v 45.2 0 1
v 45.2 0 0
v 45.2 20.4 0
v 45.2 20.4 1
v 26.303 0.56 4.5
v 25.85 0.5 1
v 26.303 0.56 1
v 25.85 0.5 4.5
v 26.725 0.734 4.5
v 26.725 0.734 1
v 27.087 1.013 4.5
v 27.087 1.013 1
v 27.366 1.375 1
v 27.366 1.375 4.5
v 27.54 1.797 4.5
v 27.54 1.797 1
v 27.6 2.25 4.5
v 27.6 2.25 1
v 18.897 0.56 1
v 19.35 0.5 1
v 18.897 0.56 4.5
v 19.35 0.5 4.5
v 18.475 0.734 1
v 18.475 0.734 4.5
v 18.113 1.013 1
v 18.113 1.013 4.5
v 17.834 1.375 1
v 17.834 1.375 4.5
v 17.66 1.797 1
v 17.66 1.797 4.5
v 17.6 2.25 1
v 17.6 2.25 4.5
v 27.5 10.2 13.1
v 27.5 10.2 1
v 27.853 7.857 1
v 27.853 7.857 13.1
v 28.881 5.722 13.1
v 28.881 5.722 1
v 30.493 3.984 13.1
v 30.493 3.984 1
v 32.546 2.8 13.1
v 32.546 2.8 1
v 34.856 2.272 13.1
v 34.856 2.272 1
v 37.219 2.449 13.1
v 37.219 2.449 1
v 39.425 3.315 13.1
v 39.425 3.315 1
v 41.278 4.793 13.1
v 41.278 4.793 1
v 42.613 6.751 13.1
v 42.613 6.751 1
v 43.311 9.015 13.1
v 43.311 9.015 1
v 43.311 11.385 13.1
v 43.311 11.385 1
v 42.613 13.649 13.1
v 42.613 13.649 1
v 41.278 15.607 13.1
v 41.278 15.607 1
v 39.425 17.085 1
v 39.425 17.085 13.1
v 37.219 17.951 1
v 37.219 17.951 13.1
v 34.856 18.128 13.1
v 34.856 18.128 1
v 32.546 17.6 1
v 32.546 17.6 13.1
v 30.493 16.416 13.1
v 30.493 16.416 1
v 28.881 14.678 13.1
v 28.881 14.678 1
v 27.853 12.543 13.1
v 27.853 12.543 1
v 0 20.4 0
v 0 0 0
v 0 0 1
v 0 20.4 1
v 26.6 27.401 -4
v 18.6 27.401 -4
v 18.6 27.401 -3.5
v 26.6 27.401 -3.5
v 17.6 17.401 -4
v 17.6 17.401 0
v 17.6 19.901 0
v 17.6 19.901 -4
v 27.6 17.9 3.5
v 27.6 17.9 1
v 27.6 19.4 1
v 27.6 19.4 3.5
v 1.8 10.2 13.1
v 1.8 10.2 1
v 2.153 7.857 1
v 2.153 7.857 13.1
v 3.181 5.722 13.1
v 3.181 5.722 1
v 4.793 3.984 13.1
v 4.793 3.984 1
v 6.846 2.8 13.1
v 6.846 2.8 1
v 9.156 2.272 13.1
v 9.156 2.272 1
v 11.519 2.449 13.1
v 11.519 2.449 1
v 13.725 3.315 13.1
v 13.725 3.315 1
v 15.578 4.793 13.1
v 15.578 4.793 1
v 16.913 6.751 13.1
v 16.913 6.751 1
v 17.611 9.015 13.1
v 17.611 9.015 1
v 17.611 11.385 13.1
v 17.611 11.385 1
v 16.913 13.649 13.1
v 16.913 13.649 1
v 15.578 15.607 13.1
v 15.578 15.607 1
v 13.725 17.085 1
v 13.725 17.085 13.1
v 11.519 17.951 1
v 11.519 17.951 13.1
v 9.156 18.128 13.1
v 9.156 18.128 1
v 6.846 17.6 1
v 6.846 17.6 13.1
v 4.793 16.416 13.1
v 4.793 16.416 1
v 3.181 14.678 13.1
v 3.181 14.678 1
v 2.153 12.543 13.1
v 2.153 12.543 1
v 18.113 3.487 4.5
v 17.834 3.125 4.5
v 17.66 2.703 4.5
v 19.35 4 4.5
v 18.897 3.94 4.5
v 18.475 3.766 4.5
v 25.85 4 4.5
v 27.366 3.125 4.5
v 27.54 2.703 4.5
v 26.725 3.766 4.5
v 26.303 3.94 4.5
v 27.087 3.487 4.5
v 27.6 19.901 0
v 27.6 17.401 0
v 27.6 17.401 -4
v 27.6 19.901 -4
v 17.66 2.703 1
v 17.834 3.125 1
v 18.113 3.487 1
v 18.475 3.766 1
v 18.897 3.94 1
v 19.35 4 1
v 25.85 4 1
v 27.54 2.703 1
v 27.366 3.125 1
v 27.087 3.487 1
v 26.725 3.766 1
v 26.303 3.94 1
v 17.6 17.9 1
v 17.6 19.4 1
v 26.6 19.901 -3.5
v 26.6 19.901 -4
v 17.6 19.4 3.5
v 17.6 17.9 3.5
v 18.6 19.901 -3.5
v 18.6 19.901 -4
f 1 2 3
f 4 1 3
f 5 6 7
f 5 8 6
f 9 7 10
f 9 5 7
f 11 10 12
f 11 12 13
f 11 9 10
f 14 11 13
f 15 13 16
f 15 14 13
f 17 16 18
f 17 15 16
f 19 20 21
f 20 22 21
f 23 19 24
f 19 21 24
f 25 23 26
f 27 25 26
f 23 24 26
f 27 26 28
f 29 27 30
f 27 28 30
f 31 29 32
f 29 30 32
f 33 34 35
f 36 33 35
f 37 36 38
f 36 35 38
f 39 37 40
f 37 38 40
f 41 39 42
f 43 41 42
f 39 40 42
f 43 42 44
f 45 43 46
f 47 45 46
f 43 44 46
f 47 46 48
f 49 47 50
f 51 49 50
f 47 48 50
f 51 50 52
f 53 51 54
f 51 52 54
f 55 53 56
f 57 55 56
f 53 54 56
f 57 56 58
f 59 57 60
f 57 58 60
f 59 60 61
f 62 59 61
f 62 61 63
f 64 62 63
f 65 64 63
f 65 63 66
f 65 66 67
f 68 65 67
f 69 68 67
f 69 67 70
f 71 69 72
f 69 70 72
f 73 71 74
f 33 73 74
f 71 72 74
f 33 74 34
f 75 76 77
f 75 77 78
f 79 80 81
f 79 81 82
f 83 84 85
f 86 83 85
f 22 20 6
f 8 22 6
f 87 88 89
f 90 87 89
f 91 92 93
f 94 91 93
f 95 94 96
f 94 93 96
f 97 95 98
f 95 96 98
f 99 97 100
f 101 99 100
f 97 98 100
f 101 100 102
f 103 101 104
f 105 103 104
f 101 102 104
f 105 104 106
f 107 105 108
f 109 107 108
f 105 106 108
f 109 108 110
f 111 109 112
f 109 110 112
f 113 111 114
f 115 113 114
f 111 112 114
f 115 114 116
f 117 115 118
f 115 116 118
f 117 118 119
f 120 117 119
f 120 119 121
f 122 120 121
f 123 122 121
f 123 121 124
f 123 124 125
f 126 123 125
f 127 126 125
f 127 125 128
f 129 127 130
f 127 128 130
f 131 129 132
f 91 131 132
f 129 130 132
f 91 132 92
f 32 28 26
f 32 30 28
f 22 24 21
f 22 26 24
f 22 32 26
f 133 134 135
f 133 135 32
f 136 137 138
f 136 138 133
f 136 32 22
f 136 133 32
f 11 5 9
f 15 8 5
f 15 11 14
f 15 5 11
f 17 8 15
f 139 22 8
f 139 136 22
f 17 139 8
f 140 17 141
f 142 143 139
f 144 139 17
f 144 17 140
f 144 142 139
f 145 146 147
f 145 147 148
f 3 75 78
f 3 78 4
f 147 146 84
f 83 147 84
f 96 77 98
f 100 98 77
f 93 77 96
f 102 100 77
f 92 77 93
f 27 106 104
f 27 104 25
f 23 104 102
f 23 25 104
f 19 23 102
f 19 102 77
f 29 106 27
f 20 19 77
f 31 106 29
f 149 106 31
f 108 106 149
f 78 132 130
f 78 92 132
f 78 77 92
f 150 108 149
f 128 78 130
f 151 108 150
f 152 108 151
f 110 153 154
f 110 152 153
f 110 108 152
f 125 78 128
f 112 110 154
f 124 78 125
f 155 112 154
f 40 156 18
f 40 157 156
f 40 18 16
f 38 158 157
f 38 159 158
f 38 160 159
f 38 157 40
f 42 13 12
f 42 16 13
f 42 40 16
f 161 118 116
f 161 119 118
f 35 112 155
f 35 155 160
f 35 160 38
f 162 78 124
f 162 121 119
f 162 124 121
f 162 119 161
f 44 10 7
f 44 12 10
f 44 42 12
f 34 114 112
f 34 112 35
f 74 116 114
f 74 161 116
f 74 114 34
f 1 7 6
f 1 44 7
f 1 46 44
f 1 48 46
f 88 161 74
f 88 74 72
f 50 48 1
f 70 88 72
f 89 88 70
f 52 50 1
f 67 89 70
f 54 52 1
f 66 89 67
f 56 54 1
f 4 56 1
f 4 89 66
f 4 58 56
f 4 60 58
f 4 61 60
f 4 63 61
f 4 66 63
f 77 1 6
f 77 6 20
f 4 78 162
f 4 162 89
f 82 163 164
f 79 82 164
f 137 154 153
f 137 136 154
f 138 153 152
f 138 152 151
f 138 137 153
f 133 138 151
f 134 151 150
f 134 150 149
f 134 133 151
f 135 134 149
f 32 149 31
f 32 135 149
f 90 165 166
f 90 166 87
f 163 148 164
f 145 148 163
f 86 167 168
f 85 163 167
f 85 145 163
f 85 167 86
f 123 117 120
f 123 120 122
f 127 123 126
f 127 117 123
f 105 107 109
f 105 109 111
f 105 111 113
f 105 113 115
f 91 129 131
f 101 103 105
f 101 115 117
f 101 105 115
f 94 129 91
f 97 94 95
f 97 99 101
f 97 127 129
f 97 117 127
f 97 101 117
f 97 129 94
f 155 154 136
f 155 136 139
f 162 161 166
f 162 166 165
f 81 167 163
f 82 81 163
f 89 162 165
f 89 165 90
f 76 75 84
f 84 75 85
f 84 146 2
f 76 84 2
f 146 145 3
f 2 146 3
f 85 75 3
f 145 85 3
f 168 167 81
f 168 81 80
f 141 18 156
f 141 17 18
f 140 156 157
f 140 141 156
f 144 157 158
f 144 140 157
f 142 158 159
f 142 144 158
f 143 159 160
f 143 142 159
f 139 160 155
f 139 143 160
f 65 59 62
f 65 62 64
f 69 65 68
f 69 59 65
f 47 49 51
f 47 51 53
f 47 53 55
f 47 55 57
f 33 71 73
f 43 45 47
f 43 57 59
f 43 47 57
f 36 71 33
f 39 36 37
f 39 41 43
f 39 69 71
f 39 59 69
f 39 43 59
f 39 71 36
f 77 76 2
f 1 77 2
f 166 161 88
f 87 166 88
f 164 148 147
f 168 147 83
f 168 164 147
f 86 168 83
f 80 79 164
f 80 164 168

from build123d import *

# Parameters (mm, degrees)
ESBO_O1_W                = 45.2
ESBO_O1_H                = 20.4
RESSALTO_EXTRUS_O1_DEPTH = 1
ESBO_O2_R                = 7.95
RESSALTO_EXTRUS_O2_DEPTH = 12.1
ESBO_O3_W                = 10
ESBO_O3_H                = 3.5
RESSALTO_EXTRUS_O3_DEPTH = 3.5
FILETE1_R                = 1.75
ESBO_O4_W                = 10
ESBO_O4_H                = 2.5
RESSALTO_EXTRUS_O4_DEPTH = 4
ESBO_O5_W                = 8
ESBO_O5_H                = 0.5
RESSALTO_EXTRUS_O5_DEPTH = 7.5
ESBO_O7_W                = 10
ESBO_O7_H                = 1.5
RESSALTO_EXTRUS_O6_DEPTH = 2.5


with BuildPart() as part:
    # Esboço1 → Ressalto-extrusão1 (new body)
    with BuildSketch(Plane.XY):
        with Locations((22.6, 10.2)):
            Rectangle(ESBO_O1_W, ESBO_O1_H)
    extrude(amount=RESSALTO_EXTRUS_O1_DEPTH)

    # Esboço2 → Ressalto-extrusão2 (add)
    with BuildSketch(Plane.XY.offset(1)):
        with Locations(Location((9.75, 10.2, 0), (0, 0, 180))):
            Circle(ESBO_O2_R)
        with Locations(Location((35.45, 10.2, 0), (0, 0, 180))):
            Circle(ESBO_O2_R)
    extrude(amount=RESSALTO_EXTRUS_O2_DEPTH)

    # Esboço3 → Ressalto-extrusão3 (add)
    with BuildSketch(Plane.XY.offset(1)):
        with Locations((22.6, 2.25)):
            Rectangle(ESBO_O3_W, ESBO_O3_H)
    extrude(amount=RESSALTO_EXTRUS_O3_DEPTH)

    # Filete1
    filete1_edges = [part.edges().sort_by_distance(p)[0] for p in [
        (27.6, 0.5, 2.75),
        (27.6, 4, 2.75),
        (17.6, 4, 2.75),
        (17.6, 0.5, 2.75),
    ]]
    fillet(filete1_edges, radius=FILETE1_R - 0.0001)  # a hair under: the kernel refuses the full size

    # Esboço4 → Ressalto-extrusão4 (add)
    with BuildSketch(Plane(origin=(0, 0, 0), x_dir=(-1, 0, 0), z_dir=(0, 0, -1))):
        with Locations((-22.6, 18.651439954)):
            Rectangle(ESBO_O4_W, ESBO_O4_H)
    extrude(amount=RESSALTO_EXTRUS_O4_DEPTH)

    # Esboço5 → Ressalto-extrusão5 (add)
    with BuildSketch(Plane(origin=(0, 19.901439954, 0), x_dir=(1, 0, 0), z_dir=(0, 1, 0))):
        with Locations((22.6, 3.75)):
            Rectangle(ESBO_O5_W, ESBO_O5_H)
    extrude(amount=RESSALTO_EXTRUS_O5_DEPTH)

    # Esboço7 → Ressalto-extrusão6 (add)
    with BuildSketch(Plane.XY.offset(1)):
        with Locations((22.6, 18.65)):
            Rectangle(ESBO_O7_W, ESBO_O7_H)
    extrude(amount=RESSALTO_EXTRUS_O6_DEPTH)


solid = part.part
